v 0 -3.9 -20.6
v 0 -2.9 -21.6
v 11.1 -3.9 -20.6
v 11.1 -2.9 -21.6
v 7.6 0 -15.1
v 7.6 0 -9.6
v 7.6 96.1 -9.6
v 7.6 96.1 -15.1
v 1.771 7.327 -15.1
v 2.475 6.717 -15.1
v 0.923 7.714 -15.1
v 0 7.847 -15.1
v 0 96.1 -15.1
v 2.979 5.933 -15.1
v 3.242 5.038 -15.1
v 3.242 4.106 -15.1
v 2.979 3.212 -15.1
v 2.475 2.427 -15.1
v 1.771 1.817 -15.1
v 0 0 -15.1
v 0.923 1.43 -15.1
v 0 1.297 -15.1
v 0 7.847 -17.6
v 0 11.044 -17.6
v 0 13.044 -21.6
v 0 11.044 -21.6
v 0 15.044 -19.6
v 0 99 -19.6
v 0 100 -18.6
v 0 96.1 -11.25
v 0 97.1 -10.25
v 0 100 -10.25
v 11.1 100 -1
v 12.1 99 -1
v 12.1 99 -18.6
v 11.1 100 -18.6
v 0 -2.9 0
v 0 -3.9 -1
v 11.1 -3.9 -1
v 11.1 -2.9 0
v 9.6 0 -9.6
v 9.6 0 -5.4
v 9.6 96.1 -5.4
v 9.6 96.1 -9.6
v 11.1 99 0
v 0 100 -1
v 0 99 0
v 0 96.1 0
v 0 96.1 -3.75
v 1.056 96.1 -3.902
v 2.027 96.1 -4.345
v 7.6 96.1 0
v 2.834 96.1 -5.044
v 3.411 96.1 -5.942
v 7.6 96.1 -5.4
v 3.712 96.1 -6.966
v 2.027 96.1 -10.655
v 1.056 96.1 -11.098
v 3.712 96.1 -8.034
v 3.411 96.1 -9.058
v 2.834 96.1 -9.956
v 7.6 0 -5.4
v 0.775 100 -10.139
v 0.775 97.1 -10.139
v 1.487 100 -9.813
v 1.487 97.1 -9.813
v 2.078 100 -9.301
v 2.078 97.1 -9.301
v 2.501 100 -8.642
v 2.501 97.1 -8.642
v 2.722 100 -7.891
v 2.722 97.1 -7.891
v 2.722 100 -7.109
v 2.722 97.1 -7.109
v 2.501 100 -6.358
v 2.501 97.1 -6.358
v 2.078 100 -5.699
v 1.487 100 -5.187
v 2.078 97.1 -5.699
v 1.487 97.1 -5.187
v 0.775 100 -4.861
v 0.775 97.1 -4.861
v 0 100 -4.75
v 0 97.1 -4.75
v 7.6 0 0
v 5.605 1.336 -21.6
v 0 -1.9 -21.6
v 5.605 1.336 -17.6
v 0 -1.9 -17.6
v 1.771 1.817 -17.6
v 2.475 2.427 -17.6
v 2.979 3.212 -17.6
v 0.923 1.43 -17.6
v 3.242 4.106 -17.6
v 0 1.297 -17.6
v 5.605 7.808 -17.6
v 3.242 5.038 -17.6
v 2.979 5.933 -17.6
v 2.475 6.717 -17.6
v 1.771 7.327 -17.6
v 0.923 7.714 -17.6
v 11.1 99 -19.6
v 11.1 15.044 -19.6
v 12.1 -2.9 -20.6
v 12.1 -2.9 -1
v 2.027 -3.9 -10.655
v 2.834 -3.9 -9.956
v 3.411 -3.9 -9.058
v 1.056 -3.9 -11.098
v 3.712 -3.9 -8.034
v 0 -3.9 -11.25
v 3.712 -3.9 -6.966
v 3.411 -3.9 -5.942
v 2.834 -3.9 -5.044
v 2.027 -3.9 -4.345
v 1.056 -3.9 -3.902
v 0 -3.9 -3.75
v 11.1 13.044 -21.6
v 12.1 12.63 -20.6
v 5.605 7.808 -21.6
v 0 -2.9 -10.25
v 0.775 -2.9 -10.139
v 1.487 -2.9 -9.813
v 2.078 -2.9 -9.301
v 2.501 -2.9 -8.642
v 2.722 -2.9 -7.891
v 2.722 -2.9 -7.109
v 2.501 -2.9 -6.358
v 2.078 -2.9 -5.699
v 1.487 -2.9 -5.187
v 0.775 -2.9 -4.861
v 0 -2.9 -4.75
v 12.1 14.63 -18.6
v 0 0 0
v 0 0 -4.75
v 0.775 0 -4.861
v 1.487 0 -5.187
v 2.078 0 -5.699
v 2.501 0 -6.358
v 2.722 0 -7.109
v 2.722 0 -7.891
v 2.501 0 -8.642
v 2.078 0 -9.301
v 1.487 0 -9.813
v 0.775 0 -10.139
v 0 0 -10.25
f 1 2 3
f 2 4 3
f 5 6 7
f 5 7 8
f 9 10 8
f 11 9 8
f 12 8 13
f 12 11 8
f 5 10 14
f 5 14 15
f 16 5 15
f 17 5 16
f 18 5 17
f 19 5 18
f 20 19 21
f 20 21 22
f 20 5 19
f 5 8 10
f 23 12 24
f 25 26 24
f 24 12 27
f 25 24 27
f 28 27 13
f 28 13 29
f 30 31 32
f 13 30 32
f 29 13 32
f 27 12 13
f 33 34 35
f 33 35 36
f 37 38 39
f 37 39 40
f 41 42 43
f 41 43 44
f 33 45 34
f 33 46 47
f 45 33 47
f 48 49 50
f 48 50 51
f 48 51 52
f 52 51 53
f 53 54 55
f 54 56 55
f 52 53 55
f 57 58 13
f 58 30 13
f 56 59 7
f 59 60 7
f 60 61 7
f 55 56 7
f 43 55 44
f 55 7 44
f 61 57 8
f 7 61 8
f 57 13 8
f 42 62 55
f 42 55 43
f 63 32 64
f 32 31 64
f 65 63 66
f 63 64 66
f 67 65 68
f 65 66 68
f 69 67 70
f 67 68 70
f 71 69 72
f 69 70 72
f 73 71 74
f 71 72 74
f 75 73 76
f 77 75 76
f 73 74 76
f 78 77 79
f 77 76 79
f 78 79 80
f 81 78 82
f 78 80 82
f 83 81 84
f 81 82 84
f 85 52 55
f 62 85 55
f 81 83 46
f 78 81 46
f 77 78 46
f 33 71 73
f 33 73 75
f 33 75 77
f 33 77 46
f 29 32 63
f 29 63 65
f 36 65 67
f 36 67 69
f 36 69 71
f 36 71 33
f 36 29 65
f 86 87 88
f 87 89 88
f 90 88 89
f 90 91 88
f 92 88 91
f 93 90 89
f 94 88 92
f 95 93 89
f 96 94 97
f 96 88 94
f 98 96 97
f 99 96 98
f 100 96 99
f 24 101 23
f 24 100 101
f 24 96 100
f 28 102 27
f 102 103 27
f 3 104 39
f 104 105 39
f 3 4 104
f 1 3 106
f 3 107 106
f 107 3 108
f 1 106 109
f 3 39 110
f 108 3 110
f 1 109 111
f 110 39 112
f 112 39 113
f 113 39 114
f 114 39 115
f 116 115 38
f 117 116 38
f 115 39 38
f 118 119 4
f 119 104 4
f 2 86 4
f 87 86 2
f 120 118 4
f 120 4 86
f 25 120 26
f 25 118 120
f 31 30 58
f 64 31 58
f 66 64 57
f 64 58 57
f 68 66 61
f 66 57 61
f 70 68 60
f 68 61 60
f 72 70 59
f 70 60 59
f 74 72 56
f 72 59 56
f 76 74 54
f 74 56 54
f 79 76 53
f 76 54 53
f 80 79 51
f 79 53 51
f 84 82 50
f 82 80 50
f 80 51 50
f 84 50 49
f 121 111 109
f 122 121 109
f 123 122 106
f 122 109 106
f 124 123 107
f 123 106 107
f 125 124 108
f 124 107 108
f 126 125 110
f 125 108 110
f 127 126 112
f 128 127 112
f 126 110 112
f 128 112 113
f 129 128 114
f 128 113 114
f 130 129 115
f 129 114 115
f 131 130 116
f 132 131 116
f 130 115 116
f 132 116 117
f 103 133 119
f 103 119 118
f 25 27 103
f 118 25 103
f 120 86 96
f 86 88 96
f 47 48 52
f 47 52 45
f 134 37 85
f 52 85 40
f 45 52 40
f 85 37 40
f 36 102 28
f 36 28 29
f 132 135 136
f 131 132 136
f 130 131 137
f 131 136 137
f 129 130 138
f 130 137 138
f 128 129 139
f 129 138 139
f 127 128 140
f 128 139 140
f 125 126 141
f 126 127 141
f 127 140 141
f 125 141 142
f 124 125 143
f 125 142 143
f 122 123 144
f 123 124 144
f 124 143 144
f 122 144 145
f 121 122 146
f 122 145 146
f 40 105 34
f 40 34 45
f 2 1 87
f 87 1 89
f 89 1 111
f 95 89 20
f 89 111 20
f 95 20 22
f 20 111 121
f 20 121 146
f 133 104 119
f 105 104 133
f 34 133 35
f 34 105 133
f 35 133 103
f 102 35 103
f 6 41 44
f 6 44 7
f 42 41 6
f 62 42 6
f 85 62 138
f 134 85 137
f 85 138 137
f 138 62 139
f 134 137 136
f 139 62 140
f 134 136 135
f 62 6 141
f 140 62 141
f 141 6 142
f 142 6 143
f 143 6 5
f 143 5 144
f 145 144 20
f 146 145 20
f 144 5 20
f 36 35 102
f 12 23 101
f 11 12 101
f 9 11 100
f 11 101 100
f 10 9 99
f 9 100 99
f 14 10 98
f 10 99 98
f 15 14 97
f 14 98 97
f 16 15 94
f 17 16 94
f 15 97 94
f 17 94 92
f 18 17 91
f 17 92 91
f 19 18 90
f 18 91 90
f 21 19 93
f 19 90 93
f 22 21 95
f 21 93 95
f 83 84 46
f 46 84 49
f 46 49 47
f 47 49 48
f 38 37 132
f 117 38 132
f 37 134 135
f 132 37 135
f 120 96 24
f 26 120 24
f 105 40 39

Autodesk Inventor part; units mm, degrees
ref_plane "YZ Plane" through (0, 0, 0) normal (1, 0, 0) x (0, 1, 0)
ref_plane "XZ Plane" through (0, 0, 0) normal (0, 1, 0) x (-1, 0, 0)
sketch "Sketch1" plane through (0, 0, 0) normal (0, 1, 0) x (-1, 0, 0)
  line L0 (0, 0) -> (-7.5, 0)
  line L1 (-7.5, -15) -> (0, -15)
  line L2 (0, -15) -> (0, 0)
  line L3 (-7.5, -9.5) -> (-9.5, -9.5)
  line L4 (-9.5, -9.5) -> (-9.5, -5.5)
  line L5 (-9.5, -5.5) -> (-7.5, -5.5)
  line L6 (-7.5, 0) -> (-7.5, -5.5)
  line L7 (-7.5, -9.5) -> (-7.5, -15)
  line L8 (-7.6, -15.1) -> (0.1, -15.1)
  line L9 (0.1, -15.1) -> (0.1, 0.1)
  line L10 (0.1, 0.1) -> (-7.6, 0.1)
  line L11 (-7.6, 0.1) -> (-7.6, -5.4)
  line L12 (-7.6, -5.4) -> (-9.6, -5.4)
  line L13 (-9.6, -5.4) -> (-9.6, -9.6)
  line L14 (-9.6, -9.6) -> (-7.6, -9.6)
  line L15 (-7.6, -9.6) -> (-7.6, -15.1)
  line L16 (0, 0) -> (-12.1, 0)
  line L17 (-12.1, 0) -> (-12.1, -19.6)
  line L18 (-12.1, -19.6) -> (0, -19.6)
  line L19 (0, -19.6) -> (0, 0)
  point P0 (-7.6, 0)
  point P1 (0, -15.1)
  dimension "d2" = 7.5
  dimension "d3" = 15
  dimension "d8" = 4
  dimension "d9" = 2
  dimension "d10" = 5.5
  dimension "d11" = 0.1
  dimension "d12" = 4.5
  dimension "d13" = 4.5
extrude "Extrusion1" add sketch "Sketch1" along normal blind 96.1 contours L11 L12 L13 L14 L15 L8 L19 L18 L17 L16
ref_plane "Work Plane1" through (0, 48.05, 0) normal (0, -1, 0) x (1, 0, 0)
sketch "Sketch2" plane through (0, 96.1, 0) normal (0, 1, 0) x (1, 0, 0)
  line L0 (7.6, 9.6) -> (9.6, 9.6) projected
  line L1 (9.6, 9.6) -> (9.6, 5.4) projected
  line L2 (9.6, 5.4) -> (7.6, 5.4) projected
  line L3 (7.6, 5.4) -> (7.6, 0) projected
  line L4 (7.6, 0) -> (12.1, 0) projected
  line L5 (12.1, 0) -> (12.1, 19.6) projected
  line L6 (12.1, 19.6) -> (0, 19.6) projected
  line L7 (0, 19.6) -> (0, 15.1) projected
  line L8 (0, 15.1) -> (7.6, 15.1) projected
  line L9 (7.6, 15.1) -> (7.6, 9.6) projected
  line L10 (12.1, 0) -> (12.1, 19.6) projected
  line L11 (12.1, 19.6) -> (0, 19.6)
  line L12 (0, 19.6) -> (0, 0)
  line L13 (0, 0) -> (12.1, 0)
  line L14 (12.1, 0) -> (12.1, 19.6)
  circle A0 centre (0, 7.5) radius 2.75
  line L15 (0, 7.5) -> (9.6, 7.5)
  line L16 (9.6, 9.6) -> (9.6, 5.4) projected
  point P0 (0, 10.25)
  point P1 (0, 4.75)
  dimension "d16" = 5.5
extrude "Extrusion2" add sketch "Sketch2" along normal blind 3.9 contours L9 L8 L7 L6 L5 L4 L3 L2 L1 L0 | L0 L1 L15 A0 L12 L8 L9 | L1 L2 L3 L13 L12 A0 L15
mirror "Mirror1" about plane through (0, 48.05, 0) normal (0, -1, 0) of "Extrusion2"
chamfer "Chamfer1" distance 1 angle 45 2 edges at (2.75, 96.1, -7.5) (2.75, -3.9, -7.5)
sketch "Sketch5" plane through (12.1, 100, -19.6) normal (0, 0, -1) x (-1, 0, 0)
  circle A0 centre (12.1, -95.4279) radius 3.275
  line L0 (12.1, -88.9558) -> (17.705, -92.1919)
  line L1 (17.705, -92.1919) -> (17.705, -98.664)
  line L2 (17.705, -98.664) -> (12.1, -101.9)
  line L3 (12.1, -101.9) -> (6.495, -98.664)
  line L4 (6.495, -98.664) -> (6.495, -92.1919)
  line L5 (6.495, -92.1919) -> (12.1, -88.9558)
  line L6 (6.495, -92.1919) -> (17.705, -98.664) construction
  line L7 (17.705, -92.1919) -> (6.495, -98.664) construction
  line L8 (12.1, -103.9) -> (12.1, 0) projected
  dimension "d26" = 6.55
  dimension "d27" = 11.21
  dimension "d48" = 2
extrude "Extrusion3" cut sketch "Sketch5" against normal blind 2
extrude "Extrusion7" cut sketch "Sketch5" against normal through all contours A0 L8 | L8 A0
sketch "Sketch7" plane through (12.1, 100, -19.6) normal (0, 0, -1) x (-1, 0, 0)
  line L0 (0, -103.9) -> (0, 0) projected
  line L1 (12.1, -86.9558) -> (0, -86.9558)
  line L2 (0, -86.9558) -> (0, -103.9)
  line L3 (0, -103.9) -> (12.1, -103.9)
  line L4 (12.1, -103.9) -> (12.1, -86.9558)
  arc A0 (12.1, -92.1529) -> (12.1, -98.7029) centre (12.1, -95.4279) ccw projected
  line L5 (12.1, -88.9558) -> (12.1, -92.1529) projected
  line L6 (6.495, -92.1919) -> (12.1, -88.9558) projected
  line L7 (6.495, -98.664) -> (6.495, -92.1919) projected
  line L8 (12.1, -101.9) -> (6.495, -98.664) projected
  line L9 (12.1, -98.7029) -> (12.1, -101.9) projected
  line L10 (12.1, -88.9558) -> (12.1, 0) projected
  point P0 (12.1, -100)
  point P1 (12.1, -88.9558)
  point P2 (0, -86.9558)
  dimension "d51" = 2
extrude "Extrusion8" add sketch "Sketch7" along normal blind 2 contours L0 L1 L4 L6 L7 L8 L3
chamfer "Chamfer4" distance 2 angle 45 1 edges at (6.05, 13.0442, -19.6)
chamfer "Chamfer3" distance 1 angle 45 10 edges at (6.05, -3.9, 0) (12.1, 100, -9.8) (6.05, 100, -19.6) (6.05, 100, 0) (12.1, 48.05, 0) (12.1, -3.9, -10.8) (6.05, -3.9, -21.6) (12.1, 14.0441, -20.5999) (12.1, 57.522, -19.6) (12.1, 4.5721, -21.6)
properties part number "lead_screw_housing"
